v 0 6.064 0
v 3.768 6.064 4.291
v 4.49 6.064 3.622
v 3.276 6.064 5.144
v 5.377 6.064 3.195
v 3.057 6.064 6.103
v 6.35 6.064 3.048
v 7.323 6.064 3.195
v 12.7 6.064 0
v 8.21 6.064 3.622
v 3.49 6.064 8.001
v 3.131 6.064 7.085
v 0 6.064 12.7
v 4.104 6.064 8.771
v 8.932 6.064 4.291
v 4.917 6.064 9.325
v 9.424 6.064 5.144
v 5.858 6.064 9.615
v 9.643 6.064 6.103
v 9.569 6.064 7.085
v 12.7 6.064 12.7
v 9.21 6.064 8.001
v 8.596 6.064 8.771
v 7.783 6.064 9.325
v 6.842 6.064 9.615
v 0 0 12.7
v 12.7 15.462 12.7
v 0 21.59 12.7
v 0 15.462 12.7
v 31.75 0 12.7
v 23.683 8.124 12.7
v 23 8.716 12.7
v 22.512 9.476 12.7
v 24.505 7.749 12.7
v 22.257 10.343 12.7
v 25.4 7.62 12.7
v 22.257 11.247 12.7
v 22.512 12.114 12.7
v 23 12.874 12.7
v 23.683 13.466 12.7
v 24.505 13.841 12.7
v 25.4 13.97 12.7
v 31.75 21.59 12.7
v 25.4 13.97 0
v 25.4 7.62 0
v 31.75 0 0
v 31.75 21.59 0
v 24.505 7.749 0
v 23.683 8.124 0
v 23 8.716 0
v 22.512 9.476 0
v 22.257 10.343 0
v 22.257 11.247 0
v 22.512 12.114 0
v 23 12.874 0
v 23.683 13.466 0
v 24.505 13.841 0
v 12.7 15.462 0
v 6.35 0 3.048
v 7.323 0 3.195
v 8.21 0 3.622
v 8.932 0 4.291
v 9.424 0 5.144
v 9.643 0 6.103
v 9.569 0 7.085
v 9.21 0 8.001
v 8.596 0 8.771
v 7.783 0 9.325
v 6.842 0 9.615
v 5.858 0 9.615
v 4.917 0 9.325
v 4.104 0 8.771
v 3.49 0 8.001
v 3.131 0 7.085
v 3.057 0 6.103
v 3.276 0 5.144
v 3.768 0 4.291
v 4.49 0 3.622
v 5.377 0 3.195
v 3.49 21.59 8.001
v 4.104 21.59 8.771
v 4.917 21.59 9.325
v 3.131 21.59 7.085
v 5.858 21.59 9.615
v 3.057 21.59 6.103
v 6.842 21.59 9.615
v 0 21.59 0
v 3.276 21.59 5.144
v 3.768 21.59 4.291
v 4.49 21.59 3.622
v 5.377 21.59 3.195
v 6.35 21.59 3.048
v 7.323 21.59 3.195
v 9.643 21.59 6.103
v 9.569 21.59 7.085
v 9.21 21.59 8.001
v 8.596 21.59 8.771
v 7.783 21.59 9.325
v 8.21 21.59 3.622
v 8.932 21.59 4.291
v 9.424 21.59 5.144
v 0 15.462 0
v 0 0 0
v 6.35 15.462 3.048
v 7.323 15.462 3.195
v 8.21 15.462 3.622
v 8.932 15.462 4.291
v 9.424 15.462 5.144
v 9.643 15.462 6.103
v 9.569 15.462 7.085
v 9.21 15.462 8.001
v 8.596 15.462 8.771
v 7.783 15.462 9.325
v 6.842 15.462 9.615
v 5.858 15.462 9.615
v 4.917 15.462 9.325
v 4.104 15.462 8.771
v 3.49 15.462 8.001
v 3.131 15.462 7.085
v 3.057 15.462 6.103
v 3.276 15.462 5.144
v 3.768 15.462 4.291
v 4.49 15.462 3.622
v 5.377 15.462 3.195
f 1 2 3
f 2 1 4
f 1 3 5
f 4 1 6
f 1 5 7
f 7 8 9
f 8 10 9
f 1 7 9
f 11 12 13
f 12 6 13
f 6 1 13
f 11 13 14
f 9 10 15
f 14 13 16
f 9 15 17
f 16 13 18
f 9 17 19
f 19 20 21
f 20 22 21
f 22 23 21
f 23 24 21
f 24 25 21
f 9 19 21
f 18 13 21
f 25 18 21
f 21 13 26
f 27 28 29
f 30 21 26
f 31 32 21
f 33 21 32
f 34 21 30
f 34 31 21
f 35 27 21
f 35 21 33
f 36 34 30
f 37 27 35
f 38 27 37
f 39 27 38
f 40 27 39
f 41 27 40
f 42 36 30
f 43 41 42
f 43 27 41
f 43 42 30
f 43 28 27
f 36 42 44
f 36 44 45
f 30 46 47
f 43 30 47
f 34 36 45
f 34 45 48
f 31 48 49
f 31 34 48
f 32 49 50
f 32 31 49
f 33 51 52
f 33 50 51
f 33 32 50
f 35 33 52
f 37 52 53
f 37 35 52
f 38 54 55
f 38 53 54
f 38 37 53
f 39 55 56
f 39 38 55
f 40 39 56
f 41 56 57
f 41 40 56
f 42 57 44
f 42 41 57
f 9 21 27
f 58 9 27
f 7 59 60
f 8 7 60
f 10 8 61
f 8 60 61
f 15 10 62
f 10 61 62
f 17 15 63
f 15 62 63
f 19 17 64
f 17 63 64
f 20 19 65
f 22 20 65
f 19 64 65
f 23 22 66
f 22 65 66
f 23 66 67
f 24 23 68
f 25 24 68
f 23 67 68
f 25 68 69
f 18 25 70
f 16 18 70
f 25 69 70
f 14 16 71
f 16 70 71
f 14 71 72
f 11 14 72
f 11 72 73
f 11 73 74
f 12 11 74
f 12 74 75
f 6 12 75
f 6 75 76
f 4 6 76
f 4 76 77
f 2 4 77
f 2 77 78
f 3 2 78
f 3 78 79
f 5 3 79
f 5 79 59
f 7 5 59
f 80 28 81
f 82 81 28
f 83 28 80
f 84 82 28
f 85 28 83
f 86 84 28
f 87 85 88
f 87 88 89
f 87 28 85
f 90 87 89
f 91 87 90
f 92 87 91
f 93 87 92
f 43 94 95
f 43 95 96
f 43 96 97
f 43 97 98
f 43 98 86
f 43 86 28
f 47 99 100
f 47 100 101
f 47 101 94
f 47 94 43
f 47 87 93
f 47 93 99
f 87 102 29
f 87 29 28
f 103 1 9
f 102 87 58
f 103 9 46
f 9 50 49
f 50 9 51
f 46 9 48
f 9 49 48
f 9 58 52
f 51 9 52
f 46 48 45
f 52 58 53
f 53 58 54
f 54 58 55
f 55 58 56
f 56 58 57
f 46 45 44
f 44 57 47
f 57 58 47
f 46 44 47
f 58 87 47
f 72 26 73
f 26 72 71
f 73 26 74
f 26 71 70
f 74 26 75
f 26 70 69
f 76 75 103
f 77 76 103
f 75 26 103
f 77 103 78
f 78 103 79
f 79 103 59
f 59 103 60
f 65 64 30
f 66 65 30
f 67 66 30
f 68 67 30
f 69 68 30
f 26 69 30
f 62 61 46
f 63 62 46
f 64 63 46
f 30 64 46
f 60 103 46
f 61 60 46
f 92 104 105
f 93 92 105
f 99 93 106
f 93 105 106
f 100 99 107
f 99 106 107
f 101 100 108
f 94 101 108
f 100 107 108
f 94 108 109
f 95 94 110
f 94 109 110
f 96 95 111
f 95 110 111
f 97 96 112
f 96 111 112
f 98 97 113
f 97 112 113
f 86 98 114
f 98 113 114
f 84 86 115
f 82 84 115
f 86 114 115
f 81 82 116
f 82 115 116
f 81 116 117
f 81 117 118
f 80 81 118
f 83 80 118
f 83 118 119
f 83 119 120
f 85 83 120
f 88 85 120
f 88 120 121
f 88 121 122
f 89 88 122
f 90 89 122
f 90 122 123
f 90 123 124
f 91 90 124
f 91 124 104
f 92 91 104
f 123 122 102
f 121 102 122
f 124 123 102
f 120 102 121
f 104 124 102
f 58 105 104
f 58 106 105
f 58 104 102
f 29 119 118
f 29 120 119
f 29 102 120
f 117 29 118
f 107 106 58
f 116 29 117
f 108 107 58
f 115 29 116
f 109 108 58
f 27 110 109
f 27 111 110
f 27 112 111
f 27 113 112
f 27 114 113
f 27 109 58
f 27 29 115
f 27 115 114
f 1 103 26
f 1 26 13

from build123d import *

# Parameters (mm, degrees)
SKETCH1_W           = 31.75
SKETCH1_H           = 21.59
BOSS_EXTRUDE1_DEPTH = 12.7
SKETCH2_W           = 12.7
SKETCH2_H           = 9.398
CUT_EXTRUDE1_DEPTH  = 12.954
SKETCH3_R           = 3.302
CUT_EXTRUDE2_DEPTH  = 25.4
CUT_EXTRUDE3_DEPTH  = 31.75


with BuildPart() as part:
    # Sketch1 → Boss-Extrude1 (new body)
    with BuildSketch(Plane.XY):
        with Locations((15.875, 10.795)):
            Rectangle(SKETCH1_W, SKETCH1_H)
    extrude(amount=BOSS_EXTRUDE1_DEPTH)

    # Sketch2 → Cut-Extrude1 (cut)
    with BuildSketch(Plane.XY.offset(12.7)):
        with Locations((6.35, 10.763108956)):
            Rectangle(SKETCH2_W, SKETCH2_H)
    extrude(amount=-CUT_EXTRUDE1_DEPTH, mode=Mode.SUBTRACT)

    # Sketch3 → Cut-Extrude2 (cut)
    with BuildSketch(Plane.XZ):
        with Locations(Location((6.35, 6.35, 0), (0, 0, 270))):
            Circle(SKETCH3_R)
    extrude(amount=-CUT_EXTRUDE2_DEPTH, mode=Mode.SUBTRACT)

    # Sketch5 → Cut-Extrude3 (cut)
    with BuildSketch(Plane.XY.offset(12.7)):
        with BuildLine():
            Line((25.4, 13.97), (25.4, 7.62))
            ThreePointArc((25.4, 7.62), (22.225, 10.795), (25.4, 13.97))
        make_face()
    extrude(amount=-CUT_EXTRUDE3_DEPTH, mode=Mode.SUBTRACT)


solid = part.part
